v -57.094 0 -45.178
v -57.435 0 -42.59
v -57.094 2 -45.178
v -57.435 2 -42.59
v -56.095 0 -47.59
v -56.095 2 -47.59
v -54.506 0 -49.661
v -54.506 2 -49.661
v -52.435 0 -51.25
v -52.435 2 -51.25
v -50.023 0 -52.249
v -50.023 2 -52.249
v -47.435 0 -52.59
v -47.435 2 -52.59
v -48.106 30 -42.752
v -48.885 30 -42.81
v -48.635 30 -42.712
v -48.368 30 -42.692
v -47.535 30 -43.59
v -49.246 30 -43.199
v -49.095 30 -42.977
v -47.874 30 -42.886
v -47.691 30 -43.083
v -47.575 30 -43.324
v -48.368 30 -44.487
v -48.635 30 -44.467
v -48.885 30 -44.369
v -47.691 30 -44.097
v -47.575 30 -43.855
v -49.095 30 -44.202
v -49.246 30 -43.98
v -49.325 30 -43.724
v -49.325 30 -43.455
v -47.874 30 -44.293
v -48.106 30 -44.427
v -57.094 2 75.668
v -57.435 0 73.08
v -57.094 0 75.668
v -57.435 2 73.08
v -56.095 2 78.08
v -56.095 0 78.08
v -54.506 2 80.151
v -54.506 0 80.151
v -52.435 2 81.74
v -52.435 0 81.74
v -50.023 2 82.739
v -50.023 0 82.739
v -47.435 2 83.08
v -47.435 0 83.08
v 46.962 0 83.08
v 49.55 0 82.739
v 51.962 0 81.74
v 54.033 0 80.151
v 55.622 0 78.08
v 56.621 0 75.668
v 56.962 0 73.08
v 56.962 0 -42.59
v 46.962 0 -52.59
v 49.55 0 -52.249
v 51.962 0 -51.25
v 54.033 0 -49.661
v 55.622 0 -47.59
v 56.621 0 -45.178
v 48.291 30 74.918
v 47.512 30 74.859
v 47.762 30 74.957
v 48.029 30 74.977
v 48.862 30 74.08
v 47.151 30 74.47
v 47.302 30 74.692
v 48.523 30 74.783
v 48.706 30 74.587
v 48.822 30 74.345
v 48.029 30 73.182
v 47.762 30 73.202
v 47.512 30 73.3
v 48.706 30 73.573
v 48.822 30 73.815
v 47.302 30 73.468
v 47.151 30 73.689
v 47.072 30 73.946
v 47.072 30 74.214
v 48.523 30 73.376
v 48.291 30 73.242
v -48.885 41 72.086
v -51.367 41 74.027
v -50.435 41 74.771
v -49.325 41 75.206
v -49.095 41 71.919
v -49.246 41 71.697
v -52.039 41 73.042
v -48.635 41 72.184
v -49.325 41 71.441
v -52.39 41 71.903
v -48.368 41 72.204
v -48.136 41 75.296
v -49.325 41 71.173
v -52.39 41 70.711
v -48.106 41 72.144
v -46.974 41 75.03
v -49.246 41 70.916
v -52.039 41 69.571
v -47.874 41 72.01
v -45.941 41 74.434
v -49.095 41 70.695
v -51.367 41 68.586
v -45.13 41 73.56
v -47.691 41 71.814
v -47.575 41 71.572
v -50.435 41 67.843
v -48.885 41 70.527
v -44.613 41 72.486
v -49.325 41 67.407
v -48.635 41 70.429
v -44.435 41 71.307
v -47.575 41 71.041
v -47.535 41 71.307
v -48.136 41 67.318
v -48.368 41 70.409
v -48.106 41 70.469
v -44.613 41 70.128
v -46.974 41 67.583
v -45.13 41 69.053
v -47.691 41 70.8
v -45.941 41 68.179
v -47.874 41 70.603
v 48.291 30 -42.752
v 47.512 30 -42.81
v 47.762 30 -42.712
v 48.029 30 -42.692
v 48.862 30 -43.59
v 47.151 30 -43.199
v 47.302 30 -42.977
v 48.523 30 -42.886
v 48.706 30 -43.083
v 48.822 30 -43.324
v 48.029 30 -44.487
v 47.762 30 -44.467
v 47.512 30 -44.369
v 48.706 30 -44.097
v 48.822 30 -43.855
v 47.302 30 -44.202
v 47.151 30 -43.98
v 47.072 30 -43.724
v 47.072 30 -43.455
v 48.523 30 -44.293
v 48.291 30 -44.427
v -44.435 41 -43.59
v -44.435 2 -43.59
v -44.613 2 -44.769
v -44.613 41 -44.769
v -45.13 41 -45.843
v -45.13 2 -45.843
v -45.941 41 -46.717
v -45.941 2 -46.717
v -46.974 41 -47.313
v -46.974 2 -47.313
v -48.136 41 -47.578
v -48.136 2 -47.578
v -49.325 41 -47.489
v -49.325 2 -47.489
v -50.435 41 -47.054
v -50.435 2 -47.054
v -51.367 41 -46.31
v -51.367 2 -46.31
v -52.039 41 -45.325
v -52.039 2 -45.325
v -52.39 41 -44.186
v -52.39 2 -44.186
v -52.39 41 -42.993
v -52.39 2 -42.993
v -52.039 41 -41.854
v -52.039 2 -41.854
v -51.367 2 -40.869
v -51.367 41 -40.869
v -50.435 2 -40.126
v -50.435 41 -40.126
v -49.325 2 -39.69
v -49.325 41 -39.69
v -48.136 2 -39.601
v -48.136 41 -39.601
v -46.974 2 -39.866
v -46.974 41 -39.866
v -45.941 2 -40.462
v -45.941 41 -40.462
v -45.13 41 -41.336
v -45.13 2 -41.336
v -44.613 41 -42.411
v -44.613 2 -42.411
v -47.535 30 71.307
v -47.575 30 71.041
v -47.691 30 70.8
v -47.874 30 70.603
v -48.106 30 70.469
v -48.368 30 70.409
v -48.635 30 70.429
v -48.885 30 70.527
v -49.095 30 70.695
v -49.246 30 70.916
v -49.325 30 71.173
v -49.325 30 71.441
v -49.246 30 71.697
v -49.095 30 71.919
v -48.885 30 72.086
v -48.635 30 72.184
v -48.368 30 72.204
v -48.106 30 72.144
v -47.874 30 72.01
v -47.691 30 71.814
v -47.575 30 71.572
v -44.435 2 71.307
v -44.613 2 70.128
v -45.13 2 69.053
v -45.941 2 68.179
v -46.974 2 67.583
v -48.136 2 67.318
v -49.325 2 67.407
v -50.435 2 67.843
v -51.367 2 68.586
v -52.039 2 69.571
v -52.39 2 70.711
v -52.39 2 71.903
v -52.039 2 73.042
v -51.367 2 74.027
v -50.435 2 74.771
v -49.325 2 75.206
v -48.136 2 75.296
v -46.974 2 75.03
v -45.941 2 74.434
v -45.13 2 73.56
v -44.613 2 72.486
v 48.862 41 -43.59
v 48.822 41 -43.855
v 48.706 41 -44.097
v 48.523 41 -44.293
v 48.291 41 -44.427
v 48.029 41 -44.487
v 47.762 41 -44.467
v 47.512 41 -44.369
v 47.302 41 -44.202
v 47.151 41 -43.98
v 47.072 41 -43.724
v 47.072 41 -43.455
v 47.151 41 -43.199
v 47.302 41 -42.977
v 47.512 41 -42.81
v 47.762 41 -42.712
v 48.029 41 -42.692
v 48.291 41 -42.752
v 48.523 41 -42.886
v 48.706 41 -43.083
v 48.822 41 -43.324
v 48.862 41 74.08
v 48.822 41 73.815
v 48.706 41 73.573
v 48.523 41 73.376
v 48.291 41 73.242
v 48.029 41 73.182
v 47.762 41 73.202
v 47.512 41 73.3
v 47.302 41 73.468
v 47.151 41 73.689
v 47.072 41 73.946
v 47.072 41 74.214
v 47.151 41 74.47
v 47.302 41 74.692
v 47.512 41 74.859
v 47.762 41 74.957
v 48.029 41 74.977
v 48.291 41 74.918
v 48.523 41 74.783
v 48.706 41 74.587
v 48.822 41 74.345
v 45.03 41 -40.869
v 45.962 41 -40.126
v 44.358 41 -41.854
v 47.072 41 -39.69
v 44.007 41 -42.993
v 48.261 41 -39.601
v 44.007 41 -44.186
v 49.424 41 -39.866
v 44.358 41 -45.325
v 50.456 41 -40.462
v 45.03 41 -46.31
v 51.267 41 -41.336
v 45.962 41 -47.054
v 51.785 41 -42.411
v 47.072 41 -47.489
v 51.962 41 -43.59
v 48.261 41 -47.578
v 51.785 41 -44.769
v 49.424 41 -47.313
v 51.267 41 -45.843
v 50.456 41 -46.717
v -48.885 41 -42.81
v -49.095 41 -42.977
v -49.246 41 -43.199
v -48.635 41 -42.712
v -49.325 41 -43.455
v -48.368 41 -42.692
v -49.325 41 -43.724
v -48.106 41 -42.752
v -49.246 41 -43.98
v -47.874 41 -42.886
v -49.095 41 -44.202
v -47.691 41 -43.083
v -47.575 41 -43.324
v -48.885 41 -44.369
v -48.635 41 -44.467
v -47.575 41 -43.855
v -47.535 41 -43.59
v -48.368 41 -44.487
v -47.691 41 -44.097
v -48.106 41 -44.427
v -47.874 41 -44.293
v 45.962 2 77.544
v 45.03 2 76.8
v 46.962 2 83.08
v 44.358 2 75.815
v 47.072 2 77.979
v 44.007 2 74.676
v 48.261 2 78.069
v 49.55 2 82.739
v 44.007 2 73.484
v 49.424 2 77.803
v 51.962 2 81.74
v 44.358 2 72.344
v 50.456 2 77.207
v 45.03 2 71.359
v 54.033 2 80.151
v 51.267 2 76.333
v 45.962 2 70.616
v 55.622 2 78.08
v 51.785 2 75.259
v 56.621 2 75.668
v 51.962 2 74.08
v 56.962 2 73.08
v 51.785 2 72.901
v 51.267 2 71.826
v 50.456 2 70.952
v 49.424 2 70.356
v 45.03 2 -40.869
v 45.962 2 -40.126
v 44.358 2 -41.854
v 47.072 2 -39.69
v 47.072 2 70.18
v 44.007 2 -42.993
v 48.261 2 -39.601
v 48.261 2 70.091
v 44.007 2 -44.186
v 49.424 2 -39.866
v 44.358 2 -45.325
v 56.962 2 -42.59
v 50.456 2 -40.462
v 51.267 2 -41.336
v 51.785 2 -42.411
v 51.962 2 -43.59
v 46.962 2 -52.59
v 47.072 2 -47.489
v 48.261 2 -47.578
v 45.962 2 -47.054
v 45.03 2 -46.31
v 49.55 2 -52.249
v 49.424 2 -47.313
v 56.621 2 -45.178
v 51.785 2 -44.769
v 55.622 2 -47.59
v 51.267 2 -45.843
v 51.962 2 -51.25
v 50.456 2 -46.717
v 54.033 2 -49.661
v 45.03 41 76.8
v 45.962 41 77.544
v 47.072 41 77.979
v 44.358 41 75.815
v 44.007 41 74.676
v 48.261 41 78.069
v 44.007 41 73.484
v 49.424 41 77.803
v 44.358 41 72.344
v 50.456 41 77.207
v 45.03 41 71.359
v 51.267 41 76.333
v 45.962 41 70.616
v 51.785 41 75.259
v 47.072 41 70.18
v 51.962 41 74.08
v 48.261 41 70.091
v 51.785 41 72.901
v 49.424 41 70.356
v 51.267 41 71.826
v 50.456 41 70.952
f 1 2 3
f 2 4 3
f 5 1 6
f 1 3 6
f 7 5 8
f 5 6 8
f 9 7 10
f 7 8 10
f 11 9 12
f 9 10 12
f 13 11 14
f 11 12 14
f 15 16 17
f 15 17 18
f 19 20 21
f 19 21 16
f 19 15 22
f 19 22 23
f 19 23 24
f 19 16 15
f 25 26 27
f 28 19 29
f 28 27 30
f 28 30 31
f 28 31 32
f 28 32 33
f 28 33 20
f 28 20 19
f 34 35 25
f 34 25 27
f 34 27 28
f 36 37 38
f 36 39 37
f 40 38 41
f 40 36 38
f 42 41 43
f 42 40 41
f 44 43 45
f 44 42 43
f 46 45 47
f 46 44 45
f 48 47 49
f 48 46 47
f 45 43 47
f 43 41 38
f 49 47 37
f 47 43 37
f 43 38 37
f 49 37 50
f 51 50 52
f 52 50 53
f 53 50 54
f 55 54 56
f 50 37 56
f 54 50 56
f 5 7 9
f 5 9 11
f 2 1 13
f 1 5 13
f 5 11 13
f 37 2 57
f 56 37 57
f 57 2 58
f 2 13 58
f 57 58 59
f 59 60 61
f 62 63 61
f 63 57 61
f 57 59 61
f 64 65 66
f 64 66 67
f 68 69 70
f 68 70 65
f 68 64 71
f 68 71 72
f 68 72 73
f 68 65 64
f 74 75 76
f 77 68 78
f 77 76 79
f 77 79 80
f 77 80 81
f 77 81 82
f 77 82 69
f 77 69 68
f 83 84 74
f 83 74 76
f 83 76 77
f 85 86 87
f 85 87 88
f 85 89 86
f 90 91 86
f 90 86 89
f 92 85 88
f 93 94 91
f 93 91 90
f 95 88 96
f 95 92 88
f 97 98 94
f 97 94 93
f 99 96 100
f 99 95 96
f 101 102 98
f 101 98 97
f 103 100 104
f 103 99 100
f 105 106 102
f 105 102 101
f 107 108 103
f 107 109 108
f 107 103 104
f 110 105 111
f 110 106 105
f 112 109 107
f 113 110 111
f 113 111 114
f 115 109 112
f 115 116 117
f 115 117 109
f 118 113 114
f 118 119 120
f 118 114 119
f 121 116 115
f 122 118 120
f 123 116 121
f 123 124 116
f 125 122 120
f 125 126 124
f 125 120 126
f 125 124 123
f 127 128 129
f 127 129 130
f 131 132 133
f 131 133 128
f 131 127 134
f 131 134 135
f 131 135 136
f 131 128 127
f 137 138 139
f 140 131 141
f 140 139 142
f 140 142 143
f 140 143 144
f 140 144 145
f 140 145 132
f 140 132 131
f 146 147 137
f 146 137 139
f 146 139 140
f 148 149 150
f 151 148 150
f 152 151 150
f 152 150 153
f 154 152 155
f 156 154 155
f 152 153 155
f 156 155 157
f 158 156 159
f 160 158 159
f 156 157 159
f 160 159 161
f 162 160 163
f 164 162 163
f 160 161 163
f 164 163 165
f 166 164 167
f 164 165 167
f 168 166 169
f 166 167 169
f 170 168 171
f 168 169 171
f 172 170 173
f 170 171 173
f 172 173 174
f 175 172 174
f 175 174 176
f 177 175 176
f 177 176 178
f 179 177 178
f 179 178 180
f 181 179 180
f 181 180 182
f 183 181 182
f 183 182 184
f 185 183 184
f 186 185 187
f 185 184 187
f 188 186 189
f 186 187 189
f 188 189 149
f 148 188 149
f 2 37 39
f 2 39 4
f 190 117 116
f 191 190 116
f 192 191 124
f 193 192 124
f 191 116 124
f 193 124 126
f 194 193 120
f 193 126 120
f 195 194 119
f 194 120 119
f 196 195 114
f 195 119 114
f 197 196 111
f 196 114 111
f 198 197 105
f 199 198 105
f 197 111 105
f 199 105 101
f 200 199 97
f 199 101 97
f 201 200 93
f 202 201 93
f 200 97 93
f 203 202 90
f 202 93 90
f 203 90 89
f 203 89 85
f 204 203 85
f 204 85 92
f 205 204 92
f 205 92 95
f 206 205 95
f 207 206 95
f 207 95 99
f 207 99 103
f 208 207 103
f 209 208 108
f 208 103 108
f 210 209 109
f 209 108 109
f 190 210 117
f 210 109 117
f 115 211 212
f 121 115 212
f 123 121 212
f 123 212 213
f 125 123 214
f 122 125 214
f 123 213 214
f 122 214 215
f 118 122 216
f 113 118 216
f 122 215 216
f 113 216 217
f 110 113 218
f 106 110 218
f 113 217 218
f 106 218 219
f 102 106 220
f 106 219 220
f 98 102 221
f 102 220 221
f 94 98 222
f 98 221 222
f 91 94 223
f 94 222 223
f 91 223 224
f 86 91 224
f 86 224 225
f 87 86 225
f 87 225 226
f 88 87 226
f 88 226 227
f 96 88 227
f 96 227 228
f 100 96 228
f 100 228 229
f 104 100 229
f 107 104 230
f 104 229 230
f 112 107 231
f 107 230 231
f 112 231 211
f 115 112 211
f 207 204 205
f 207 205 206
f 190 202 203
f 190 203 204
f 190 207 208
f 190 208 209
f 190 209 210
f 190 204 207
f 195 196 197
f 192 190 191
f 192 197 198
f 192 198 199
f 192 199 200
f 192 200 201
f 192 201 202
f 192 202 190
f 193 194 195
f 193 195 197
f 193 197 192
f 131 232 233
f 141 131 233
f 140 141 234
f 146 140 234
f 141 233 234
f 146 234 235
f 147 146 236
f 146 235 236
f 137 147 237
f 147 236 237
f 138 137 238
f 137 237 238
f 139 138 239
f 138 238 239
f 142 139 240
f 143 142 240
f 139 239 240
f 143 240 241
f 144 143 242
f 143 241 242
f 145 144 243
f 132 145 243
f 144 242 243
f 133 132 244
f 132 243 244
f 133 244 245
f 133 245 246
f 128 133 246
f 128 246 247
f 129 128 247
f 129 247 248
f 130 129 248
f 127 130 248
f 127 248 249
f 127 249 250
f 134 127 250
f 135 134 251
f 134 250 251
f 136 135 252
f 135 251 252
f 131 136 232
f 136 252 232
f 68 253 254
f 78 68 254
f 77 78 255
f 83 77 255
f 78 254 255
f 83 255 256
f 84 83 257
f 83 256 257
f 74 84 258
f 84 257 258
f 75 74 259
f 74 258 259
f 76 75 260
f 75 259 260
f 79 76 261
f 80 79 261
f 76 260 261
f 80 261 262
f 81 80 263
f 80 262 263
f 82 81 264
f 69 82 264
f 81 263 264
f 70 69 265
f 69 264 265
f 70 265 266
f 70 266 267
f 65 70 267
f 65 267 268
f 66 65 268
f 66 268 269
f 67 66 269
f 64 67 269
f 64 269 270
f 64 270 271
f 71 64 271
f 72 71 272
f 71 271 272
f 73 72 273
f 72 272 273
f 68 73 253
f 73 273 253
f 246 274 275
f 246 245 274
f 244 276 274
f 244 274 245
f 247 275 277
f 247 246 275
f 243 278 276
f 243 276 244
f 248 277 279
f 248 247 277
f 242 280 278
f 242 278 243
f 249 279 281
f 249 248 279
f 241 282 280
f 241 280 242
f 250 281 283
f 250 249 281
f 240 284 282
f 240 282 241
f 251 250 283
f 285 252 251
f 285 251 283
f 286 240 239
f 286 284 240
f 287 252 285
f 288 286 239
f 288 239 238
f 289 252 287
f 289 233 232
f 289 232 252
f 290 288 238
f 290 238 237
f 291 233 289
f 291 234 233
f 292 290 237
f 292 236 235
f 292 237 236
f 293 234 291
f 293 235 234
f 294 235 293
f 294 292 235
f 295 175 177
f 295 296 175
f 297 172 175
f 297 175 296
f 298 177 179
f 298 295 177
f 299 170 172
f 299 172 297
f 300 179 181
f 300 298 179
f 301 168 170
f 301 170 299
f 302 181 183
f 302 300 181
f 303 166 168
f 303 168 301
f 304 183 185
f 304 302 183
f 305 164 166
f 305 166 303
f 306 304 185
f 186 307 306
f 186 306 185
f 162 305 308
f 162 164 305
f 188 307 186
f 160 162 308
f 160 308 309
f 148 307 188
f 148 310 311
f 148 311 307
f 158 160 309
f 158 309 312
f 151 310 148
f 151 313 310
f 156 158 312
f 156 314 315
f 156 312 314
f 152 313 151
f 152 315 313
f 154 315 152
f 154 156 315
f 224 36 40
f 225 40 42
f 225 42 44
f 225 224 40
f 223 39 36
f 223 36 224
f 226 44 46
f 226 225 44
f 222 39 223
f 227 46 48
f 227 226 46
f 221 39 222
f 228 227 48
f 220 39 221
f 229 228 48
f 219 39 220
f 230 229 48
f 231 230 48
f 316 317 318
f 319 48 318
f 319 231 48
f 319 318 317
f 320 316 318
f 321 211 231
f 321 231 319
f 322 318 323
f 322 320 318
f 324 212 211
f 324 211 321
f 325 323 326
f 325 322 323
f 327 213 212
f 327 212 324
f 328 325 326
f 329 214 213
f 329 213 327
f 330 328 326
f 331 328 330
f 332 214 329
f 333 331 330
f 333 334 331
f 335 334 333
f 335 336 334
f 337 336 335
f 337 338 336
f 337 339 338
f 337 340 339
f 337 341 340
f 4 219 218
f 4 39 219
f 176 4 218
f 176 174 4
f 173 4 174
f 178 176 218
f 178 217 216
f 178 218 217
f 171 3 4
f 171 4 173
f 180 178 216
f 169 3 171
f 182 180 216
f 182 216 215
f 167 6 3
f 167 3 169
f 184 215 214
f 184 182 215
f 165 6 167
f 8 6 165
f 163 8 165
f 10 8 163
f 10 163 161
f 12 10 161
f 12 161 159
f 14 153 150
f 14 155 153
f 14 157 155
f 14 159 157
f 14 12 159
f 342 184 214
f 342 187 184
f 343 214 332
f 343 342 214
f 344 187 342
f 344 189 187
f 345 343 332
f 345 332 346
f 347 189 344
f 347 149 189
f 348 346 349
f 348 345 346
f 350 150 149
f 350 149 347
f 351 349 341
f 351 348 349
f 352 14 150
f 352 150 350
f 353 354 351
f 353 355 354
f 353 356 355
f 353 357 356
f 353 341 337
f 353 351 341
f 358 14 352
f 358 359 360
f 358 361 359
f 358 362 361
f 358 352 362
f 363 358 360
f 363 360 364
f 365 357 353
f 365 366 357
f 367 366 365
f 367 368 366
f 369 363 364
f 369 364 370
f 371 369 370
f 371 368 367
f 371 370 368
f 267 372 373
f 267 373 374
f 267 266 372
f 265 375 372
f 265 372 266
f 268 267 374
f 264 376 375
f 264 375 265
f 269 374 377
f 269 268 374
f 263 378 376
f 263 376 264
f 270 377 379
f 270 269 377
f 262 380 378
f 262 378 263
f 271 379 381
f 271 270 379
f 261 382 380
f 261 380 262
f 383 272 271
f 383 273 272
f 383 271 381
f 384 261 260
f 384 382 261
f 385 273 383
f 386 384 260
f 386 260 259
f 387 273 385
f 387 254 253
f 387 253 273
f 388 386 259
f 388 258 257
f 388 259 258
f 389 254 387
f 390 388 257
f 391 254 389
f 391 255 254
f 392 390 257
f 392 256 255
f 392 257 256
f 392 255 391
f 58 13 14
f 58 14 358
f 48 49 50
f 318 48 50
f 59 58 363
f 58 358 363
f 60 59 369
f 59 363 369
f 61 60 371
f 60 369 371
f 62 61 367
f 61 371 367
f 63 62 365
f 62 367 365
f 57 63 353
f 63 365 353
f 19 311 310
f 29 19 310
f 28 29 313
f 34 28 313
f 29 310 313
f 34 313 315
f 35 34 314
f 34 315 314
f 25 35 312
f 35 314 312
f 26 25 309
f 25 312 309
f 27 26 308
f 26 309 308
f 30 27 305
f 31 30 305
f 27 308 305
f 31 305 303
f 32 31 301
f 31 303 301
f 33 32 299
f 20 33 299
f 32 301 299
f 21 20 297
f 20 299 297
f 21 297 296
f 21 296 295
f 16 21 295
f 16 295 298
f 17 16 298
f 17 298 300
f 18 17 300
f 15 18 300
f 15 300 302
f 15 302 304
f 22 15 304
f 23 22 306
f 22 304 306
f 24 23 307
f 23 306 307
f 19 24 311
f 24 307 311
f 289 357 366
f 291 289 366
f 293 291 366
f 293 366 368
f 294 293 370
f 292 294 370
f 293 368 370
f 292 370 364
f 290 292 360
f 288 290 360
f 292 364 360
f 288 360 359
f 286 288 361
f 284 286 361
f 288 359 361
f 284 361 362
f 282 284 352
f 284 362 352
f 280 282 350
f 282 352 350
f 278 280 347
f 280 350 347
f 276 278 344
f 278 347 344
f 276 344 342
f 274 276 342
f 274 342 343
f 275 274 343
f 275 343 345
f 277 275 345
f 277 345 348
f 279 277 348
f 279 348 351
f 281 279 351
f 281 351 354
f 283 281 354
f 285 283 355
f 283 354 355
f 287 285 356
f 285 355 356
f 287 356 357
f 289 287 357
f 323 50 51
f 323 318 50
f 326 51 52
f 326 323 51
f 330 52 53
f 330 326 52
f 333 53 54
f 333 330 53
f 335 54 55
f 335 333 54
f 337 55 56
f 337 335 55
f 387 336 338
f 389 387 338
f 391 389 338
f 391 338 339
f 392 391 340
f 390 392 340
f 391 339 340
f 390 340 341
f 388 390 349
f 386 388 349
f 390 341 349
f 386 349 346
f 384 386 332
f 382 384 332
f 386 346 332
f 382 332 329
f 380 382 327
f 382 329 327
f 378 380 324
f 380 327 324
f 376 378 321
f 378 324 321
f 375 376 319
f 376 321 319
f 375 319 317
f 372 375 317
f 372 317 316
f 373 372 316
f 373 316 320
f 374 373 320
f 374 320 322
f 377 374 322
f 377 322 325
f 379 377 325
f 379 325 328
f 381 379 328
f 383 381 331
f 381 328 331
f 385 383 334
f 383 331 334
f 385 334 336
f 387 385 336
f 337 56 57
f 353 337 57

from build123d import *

# Parameters (mm, degrees)
SKETCH_1_W          = 114.397193433
SKETCH_1_H          = 135.669398824
EXTRUDE_1_DEPTH     = 2
SKETCH_2_R          = 4
EXTRUDE_2_DEPTH     = 39
SKETCH_3_R          = 0.9
CUT_EXTRUDE_1_DEPTH = 11
FILLET_1_R          = 10


with BuildPart() as part:
    # Эскиз1 → Бобышка-Вытянуть1 (new body)
    with BuildSketch(Plane(origin=(0, 0, 0), x_dir=(1, 0, 0), z_dir=(0, 1, 0))):
        with Locations((-0.236357837, -15.24508053)):
            Rectangle(SKETCH_1_W, SKETCH_1_H)
    extrude(amount=EXTRUDE_1_DEPTH)

    # Эскиз2 → Бобышка-Вытянуть2 (add)
    with BuildSketch(Plane(origin=(0, 2, 0), x_dir=(1, 0, 0), z_dir=(0, 1, 0))):
        with Locations((-48.434954554, 43.589618882)):
            Circle(SKETCH_2_R)
        with Locations((47.962238879, 43.589618882)):
            Circle(SKETCH_2_R)
        with Locations((47.962238879, -74.079779942)):
            Circle(SKETCH_2_R)
        with Locations((-48.434954554, -71.306708374)):
            Circle(SKETCH_2_R)
    extrude(amount=EXTRUDE_2_DEPTH)

    # Эскиз3 → Вырез-Вытянуть1 (cut)
    with BuildSketch(Plane(origin=(0, 41, 0), x_dir=(1, 0, 0), z_dir=(0, 1, 0))):
        with Locations((47.962238879, -74.079779942)):
            Circle(SKETCH_3_R)
        with Locations((-48.434954554, -71.306708374)):
            Circle(SKETCH_3_R)
        with Locations((-48.434954554, 43.589618882)):
            Circle(SKETCH_3_R)
        with Locations((47.962238879, 43.589618882)):
            Circle(SKETCH_3_R)
    extrude(amount=-CUT_EXTRUDE_1_DEPTH, mode=Mode.SUBTRACT)

    # Скругление1
    fillet_1_edges = [part.edges().sort_by_distance(p)[0] for p in [
        (-57.434954554, 1, -52.589618882),
        (56.962238879, 1, -52.589618882),
        (56.962238879, 1, 83.079779942),
        (-57.434954554, 1, 83.079779942),
    ]]
    fillet(fillet_1_edges, radius=FILLET_1_R)


solid = part.part
